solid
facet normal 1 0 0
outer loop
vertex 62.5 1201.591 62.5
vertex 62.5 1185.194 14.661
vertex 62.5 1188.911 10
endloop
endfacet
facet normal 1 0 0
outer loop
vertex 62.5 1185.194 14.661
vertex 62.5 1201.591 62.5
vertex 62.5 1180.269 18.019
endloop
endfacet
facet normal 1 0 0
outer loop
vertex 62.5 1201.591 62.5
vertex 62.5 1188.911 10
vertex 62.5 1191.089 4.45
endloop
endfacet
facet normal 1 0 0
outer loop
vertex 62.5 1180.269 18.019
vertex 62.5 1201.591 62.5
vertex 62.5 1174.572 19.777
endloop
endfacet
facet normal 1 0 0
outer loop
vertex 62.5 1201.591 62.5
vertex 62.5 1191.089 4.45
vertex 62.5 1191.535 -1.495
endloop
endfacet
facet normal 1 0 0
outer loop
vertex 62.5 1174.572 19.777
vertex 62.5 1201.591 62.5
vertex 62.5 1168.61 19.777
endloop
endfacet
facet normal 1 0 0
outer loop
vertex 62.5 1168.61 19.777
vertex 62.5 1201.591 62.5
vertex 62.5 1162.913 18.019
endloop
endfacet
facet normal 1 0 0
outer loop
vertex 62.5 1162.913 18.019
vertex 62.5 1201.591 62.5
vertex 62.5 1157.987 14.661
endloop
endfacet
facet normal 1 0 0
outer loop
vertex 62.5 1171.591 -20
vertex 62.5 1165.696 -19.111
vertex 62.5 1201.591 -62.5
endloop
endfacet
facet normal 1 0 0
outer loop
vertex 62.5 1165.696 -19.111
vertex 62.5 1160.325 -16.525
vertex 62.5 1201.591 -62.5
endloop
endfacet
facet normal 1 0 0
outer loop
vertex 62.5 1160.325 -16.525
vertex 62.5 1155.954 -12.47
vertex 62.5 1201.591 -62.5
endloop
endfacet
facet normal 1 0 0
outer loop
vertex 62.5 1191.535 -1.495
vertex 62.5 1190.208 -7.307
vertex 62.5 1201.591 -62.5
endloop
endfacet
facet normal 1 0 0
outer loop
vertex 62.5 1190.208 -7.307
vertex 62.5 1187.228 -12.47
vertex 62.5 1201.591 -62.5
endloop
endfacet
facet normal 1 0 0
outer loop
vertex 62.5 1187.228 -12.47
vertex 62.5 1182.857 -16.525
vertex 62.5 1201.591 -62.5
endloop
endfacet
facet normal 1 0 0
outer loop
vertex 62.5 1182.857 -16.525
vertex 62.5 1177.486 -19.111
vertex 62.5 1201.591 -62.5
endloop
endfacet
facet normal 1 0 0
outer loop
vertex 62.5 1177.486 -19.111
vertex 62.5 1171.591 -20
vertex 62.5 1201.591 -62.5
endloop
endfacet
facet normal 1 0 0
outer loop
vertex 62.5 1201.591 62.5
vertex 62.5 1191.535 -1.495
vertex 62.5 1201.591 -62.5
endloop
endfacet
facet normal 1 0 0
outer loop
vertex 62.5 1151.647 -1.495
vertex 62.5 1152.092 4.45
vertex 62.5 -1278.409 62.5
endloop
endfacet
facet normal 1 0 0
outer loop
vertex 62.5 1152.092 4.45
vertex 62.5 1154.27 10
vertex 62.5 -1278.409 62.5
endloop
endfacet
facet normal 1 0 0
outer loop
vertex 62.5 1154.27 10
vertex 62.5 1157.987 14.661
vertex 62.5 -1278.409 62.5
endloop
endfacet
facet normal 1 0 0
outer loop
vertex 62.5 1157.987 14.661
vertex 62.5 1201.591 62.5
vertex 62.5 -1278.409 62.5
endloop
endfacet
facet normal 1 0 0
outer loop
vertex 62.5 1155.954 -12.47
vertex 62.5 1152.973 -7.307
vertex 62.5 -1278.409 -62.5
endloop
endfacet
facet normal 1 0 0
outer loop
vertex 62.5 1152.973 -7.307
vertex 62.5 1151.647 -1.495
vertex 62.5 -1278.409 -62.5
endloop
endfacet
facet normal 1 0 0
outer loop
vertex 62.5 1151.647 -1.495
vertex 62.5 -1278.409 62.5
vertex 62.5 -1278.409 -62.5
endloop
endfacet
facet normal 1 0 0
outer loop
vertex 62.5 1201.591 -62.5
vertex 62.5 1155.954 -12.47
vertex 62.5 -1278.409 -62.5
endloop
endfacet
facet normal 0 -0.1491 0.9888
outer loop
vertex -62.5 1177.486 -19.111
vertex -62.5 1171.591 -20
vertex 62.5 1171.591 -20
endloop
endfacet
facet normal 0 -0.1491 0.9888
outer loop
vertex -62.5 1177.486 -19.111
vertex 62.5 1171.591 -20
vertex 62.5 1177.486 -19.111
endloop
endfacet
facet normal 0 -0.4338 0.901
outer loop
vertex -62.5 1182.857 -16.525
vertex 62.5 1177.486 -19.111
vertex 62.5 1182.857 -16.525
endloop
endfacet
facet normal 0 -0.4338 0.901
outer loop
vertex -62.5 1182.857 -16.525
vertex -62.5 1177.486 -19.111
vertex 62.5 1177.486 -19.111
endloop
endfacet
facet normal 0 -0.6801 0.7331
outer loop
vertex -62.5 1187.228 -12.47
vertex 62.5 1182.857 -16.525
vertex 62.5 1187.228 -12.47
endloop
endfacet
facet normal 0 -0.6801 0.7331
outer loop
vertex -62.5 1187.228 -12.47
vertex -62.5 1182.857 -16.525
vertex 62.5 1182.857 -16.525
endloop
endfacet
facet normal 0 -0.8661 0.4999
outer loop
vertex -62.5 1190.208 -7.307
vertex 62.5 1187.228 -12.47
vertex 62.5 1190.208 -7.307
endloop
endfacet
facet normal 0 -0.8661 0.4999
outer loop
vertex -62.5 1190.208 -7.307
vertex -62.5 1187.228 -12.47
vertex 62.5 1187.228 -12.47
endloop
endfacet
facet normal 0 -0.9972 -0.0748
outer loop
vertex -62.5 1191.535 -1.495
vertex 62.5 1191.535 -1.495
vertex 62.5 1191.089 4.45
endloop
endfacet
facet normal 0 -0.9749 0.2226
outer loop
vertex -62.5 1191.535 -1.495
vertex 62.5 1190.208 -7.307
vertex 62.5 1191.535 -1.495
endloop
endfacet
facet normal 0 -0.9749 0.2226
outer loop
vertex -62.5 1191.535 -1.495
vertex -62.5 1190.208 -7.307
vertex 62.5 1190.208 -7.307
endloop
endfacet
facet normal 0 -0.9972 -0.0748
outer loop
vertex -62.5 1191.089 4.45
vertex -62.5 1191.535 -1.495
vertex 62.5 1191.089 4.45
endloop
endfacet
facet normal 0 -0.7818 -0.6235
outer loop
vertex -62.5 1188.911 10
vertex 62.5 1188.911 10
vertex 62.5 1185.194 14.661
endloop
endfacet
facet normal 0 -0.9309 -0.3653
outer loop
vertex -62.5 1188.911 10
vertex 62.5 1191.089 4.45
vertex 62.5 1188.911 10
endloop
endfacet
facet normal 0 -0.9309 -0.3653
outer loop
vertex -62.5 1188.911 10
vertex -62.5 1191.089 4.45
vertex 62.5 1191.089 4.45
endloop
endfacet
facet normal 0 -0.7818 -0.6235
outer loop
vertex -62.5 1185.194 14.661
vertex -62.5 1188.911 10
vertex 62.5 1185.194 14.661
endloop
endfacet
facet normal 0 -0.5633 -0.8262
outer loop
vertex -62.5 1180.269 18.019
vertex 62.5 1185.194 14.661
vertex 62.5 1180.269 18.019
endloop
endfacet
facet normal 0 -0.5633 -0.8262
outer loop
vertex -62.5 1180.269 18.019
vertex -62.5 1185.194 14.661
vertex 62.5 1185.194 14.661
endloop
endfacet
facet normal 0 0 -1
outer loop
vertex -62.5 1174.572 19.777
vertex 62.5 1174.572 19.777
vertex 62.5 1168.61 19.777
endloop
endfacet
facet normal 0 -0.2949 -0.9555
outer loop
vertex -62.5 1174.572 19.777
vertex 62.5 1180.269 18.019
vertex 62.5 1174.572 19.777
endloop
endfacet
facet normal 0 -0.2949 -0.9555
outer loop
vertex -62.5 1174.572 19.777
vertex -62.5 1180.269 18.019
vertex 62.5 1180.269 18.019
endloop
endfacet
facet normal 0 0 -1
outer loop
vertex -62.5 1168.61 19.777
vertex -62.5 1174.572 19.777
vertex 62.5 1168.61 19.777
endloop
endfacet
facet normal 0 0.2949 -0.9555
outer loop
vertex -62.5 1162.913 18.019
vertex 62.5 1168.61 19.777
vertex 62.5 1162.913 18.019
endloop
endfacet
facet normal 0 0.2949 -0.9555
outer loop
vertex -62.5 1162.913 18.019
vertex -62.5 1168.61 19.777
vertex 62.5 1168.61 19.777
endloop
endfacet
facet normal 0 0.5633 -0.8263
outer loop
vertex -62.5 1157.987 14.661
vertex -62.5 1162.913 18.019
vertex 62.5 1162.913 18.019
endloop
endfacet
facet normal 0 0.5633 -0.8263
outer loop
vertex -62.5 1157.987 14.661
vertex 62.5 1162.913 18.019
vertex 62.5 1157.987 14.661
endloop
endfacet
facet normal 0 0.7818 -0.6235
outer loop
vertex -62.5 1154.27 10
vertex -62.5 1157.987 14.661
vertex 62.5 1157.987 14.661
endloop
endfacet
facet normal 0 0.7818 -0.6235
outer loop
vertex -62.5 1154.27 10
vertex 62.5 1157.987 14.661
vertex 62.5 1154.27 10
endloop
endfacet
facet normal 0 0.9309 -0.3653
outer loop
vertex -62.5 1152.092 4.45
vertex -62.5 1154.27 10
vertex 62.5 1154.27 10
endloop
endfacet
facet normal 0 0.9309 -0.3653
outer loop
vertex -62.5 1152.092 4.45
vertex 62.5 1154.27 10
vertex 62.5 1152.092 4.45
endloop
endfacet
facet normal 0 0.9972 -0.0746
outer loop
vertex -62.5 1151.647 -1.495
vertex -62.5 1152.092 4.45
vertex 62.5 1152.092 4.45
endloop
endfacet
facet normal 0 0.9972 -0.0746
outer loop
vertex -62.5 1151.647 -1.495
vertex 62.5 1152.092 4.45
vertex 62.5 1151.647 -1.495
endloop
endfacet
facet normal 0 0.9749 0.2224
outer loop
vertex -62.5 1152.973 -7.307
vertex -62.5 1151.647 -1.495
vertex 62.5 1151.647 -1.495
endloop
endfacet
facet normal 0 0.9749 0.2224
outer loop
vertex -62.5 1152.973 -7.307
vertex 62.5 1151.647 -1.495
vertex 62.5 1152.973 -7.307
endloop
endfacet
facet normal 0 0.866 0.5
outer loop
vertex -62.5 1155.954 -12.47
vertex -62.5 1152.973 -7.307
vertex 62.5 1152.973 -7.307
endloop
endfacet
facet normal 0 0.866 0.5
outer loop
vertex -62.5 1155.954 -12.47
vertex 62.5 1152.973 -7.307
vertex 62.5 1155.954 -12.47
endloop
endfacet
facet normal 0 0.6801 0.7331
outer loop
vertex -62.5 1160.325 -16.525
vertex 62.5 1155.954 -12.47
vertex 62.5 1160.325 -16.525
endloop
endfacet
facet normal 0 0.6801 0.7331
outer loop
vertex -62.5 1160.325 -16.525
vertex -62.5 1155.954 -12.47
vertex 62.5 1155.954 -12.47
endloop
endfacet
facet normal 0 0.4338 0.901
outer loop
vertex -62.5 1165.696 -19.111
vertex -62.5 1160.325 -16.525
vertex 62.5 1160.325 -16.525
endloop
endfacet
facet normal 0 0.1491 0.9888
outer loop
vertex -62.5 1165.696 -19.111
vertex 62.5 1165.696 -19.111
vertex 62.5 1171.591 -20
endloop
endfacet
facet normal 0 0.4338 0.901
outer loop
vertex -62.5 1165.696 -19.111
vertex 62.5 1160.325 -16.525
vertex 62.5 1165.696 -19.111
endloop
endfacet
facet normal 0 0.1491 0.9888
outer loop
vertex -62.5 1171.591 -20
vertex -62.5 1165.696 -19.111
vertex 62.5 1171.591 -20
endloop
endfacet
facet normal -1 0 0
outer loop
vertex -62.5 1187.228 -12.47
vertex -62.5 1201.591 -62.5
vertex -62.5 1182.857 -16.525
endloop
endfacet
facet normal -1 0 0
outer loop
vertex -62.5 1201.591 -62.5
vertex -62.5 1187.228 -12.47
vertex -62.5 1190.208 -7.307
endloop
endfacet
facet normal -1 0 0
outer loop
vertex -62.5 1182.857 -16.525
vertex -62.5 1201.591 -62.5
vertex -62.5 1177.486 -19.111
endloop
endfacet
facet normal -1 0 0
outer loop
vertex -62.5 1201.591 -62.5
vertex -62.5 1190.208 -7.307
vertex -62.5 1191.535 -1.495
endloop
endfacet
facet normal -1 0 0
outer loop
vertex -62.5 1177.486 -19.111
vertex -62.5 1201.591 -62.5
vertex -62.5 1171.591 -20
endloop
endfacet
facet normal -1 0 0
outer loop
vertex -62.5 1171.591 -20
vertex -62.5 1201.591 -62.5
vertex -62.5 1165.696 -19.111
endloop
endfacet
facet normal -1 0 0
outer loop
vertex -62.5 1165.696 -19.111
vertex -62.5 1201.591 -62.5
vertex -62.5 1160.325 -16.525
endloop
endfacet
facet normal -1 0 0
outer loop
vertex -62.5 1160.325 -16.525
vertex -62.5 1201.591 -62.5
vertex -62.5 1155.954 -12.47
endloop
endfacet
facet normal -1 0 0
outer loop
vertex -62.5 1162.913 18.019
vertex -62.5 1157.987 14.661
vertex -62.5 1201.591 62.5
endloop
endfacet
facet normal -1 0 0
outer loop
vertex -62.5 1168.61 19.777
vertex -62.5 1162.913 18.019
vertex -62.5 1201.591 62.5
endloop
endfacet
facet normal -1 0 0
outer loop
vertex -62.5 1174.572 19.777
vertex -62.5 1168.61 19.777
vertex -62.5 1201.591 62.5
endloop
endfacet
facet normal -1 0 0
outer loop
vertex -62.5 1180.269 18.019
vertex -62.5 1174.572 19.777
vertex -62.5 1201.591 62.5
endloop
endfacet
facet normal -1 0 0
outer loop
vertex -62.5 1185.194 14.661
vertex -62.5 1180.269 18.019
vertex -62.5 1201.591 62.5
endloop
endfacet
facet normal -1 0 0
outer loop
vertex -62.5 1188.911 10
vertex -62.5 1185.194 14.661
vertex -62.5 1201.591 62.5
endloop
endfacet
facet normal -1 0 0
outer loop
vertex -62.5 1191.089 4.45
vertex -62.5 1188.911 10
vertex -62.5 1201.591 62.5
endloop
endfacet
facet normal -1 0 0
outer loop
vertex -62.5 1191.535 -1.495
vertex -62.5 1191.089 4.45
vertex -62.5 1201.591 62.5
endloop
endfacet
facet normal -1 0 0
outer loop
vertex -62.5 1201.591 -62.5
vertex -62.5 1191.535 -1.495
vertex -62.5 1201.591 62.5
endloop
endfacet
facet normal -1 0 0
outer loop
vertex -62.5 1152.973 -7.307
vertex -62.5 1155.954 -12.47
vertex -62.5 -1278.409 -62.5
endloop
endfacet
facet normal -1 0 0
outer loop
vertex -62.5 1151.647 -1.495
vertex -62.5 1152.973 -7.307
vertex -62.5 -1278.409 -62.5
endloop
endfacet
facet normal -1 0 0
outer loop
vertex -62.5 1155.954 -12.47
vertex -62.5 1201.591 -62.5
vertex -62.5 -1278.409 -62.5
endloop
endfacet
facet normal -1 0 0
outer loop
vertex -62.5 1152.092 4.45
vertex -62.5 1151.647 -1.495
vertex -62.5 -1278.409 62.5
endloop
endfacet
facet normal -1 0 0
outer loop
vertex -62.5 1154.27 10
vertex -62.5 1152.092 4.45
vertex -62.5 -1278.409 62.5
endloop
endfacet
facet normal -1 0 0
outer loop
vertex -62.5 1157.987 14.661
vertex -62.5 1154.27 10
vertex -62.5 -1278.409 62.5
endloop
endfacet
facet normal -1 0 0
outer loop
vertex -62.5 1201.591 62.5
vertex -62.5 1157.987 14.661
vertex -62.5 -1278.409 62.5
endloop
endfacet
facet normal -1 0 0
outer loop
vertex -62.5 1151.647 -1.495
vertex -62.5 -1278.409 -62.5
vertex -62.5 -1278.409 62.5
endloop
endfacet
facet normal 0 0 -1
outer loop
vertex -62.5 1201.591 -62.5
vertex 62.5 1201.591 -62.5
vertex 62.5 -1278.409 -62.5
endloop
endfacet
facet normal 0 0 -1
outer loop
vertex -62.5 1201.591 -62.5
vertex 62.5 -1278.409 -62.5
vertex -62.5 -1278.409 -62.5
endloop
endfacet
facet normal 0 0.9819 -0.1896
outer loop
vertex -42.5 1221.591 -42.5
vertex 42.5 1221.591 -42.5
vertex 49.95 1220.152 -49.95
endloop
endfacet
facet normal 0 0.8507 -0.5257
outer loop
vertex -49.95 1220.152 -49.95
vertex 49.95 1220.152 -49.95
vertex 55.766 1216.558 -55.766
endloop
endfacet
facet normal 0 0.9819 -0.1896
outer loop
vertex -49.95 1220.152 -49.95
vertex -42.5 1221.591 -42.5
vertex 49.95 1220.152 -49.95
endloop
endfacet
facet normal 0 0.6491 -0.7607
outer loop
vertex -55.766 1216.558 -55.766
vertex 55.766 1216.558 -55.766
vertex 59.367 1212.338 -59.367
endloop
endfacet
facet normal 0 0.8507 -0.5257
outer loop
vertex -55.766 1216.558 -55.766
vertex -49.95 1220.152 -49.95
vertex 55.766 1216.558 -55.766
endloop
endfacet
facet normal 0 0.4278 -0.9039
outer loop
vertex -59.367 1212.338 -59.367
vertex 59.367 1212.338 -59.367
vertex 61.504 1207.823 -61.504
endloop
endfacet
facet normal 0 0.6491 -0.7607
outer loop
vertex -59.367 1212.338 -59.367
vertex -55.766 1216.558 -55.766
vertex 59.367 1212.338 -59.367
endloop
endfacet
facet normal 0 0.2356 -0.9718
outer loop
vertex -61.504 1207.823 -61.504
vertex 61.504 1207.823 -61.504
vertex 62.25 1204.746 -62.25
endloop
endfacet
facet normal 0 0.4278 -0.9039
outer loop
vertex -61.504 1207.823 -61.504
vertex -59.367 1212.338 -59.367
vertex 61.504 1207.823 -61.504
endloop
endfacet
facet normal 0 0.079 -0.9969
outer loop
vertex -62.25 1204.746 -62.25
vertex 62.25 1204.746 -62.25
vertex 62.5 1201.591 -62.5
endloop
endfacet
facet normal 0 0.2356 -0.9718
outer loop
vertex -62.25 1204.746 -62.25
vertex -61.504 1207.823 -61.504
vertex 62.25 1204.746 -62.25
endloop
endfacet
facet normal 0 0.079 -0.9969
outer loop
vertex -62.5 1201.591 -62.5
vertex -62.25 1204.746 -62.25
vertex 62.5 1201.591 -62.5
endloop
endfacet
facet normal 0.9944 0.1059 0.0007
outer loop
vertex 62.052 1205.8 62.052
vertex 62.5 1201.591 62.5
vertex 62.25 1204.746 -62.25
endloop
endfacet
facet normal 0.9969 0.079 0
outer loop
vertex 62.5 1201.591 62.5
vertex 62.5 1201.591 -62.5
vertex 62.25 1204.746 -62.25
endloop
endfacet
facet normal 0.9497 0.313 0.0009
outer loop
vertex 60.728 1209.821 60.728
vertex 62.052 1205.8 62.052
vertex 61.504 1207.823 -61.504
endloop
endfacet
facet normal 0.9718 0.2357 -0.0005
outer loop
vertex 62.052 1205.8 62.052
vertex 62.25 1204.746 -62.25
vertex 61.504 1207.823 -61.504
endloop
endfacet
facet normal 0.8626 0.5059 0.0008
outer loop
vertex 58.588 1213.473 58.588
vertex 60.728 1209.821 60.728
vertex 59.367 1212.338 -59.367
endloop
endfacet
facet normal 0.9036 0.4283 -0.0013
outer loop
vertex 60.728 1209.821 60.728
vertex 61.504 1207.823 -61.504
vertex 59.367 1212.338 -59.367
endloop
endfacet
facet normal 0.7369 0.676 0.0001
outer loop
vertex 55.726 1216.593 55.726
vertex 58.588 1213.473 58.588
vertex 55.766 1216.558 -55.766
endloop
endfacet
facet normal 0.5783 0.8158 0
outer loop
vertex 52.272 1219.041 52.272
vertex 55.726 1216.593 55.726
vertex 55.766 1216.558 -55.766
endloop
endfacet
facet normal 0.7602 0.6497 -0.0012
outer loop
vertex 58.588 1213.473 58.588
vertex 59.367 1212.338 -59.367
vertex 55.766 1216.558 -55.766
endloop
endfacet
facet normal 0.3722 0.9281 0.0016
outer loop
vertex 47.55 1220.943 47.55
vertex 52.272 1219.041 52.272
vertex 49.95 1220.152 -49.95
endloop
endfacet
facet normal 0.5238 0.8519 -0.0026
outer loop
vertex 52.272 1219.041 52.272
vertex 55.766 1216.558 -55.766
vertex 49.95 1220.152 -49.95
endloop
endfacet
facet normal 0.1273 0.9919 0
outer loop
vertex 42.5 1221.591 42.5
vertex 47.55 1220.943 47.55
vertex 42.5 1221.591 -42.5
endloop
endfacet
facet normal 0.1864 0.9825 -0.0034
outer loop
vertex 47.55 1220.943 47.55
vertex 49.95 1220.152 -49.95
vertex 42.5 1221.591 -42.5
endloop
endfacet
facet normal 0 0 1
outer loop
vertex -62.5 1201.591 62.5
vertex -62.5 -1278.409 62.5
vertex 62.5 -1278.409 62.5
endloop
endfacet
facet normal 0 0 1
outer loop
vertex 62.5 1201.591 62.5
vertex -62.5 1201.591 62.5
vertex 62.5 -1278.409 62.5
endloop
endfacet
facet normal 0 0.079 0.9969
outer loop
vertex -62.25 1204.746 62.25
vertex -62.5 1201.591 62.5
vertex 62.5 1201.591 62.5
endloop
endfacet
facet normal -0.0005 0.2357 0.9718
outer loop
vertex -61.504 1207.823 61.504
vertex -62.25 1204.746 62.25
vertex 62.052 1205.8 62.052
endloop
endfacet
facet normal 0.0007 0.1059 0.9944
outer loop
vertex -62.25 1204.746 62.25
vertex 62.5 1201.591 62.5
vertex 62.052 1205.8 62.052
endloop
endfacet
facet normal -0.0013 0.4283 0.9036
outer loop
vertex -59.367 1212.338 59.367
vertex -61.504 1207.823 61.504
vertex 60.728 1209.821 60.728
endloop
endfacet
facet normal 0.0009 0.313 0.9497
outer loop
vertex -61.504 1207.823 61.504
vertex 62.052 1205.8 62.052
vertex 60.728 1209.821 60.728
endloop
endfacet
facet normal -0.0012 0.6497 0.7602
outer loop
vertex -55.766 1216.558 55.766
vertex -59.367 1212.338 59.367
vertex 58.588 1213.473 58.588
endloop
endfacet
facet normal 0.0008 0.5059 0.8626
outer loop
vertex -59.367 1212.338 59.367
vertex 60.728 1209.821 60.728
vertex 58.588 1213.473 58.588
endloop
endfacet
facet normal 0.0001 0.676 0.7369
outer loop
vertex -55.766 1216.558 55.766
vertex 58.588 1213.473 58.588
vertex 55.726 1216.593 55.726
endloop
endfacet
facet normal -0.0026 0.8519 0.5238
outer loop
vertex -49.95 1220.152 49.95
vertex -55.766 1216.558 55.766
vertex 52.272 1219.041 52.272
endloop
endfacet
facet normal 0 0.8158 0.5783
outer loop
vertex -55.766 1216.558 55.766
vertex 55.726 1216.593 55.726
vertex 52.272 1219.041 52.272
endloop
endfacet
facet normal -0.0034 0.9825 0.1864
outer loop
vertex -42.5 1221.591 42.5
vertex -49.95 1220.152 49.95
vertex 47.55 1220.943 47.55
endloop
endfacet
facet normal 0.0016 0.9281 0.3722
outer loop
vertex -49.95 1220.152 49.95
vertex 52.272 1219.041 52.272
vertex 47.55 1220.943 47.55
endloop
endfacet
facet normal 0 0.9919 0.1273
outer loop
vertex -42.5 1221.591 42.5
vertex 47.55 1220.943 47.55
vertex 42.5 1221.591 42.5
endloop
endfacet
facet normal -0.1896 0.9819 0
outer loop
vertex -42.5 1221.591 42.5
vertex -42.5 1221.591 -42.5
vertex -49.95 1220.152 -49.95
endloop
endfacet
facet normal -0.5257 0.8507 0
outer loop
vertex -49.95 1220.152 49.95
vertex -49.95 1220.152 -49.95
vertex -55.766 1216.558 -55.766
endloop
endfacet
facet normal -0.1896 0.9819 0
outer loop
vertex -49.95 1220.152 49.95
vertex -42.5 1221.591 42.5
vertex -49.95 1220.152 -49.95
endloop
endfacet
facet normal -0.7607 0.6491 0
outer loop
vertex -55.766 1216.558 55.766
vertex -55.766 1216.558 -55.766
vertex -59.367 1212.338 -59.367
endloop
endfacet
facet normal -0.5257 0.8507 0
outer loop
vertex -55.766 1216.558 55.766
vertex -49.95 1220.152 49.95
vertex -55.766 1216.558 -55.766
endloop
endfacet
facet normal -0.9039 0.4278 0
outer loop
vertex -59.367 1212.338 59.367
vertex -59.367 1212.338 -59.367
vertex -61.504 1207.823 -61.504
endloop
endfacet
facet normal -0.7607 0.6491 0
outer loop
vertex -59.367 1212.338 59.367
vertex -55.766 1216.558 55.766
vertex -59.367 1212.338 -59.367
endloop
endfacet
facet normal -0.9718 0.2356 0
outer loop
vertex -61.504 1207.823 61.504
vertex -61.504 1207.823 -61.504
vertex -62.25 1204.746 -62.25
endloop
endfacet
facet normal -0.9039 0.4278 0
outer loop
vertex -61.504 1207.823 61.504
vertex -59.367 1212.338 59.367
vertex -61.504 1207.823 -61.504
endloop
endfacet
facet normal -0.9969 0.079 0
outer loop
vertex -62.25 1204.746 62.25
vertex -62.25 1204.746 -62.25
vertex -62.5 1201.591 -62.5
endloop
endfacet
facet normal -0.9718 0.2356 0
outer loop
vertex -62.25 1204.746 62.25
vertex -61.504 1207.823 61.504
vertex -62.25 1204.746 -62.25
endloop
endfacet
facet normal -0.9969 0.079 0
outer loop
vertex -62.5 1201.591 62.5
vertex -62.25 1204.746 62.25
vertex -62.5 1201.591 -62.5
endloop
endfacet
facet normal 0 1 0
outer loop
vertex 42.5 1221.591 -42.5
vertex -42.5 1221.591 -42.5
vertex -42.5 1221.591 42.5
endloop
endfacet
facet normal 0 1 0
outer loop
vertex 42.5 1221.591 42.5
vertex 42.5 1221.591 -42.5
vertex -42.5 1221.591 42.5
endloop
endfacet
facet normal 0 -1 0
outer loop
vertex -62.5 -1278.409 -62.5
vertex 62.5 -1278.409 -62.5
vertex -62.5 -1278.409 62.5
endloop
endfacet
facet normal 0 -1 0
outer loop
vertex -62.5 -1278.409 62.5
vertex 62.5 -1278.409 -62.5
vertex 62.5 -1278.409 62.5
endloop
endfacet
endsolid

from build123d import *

# Parameters (mm, degrees)
CUT_EXTRUDE1_DEPTH      = 258.20505856
CUT_EXTRUDE1_DEPTH_BACK = 258.20505856
SKETCH2_R               = 4
FILLET1_R               = 4
SCALE1_SCALE            = 5


with BuildPart() as part:
    # Sweep1: sweep along a path in Sketch1
    with BuildLine(Plane.XY) as sweep1_path:
        Line((0, 244.318181818), (0, -255.681818182))
    # 3DSketch1 → Sweep1 (sweep)
    with BuildSketch(Plane(origin=(12.5, -255.681818182, -12.5), x_dir=(-0.7071067811865476, 0, 0.7071067811865476), z_dir=(0, 1, 0))):
        Polygon((0, 0), (17.67766953, 17.67766953), (35.355339059, 0), (17.67766953, -17.67766953), align=None)
    sweep(path=sweep1_path.line)

    # Sketch2 → Cut-Extrude1 (cut, two sides: drawn at the far end of the back side and taken through both)
    with BuildSketch(Plane(origin=(12.5, 0, 0), x_dir=(0, 0, -1), z_dir=(1, 0, 0)).offset(-CUT_EXTRUDE1_DEPTH_BACK)):
        with Locations((0, 234.318181818)):
            Circle(SKETCH2_R)
    extrude(amount=CUT_EXTRUDE1_DEPTH + CUT_EXTRUDE1_DEPTH_BACK, mode=Mode.SUBTRACT)

    # Fillet1
    fillet1_edges = [part.edges().sort_by_distance(p)[0] for p in [
        (-12.5, 244.318181818, 0),
        (0, 244.318181818, -12.5),
        (12.5, 244.318181818, 0),
        (0, 244.318181818, 12.5),
    ]]
    fillet(fillet1_edges, radius=FILLET1_R)


with BuildPart() as part_1:
    # Scale1: scaled about (0, 0, 0)
    add(part.part.scale(SCALE1_SCALE))


solid = part_1.part
